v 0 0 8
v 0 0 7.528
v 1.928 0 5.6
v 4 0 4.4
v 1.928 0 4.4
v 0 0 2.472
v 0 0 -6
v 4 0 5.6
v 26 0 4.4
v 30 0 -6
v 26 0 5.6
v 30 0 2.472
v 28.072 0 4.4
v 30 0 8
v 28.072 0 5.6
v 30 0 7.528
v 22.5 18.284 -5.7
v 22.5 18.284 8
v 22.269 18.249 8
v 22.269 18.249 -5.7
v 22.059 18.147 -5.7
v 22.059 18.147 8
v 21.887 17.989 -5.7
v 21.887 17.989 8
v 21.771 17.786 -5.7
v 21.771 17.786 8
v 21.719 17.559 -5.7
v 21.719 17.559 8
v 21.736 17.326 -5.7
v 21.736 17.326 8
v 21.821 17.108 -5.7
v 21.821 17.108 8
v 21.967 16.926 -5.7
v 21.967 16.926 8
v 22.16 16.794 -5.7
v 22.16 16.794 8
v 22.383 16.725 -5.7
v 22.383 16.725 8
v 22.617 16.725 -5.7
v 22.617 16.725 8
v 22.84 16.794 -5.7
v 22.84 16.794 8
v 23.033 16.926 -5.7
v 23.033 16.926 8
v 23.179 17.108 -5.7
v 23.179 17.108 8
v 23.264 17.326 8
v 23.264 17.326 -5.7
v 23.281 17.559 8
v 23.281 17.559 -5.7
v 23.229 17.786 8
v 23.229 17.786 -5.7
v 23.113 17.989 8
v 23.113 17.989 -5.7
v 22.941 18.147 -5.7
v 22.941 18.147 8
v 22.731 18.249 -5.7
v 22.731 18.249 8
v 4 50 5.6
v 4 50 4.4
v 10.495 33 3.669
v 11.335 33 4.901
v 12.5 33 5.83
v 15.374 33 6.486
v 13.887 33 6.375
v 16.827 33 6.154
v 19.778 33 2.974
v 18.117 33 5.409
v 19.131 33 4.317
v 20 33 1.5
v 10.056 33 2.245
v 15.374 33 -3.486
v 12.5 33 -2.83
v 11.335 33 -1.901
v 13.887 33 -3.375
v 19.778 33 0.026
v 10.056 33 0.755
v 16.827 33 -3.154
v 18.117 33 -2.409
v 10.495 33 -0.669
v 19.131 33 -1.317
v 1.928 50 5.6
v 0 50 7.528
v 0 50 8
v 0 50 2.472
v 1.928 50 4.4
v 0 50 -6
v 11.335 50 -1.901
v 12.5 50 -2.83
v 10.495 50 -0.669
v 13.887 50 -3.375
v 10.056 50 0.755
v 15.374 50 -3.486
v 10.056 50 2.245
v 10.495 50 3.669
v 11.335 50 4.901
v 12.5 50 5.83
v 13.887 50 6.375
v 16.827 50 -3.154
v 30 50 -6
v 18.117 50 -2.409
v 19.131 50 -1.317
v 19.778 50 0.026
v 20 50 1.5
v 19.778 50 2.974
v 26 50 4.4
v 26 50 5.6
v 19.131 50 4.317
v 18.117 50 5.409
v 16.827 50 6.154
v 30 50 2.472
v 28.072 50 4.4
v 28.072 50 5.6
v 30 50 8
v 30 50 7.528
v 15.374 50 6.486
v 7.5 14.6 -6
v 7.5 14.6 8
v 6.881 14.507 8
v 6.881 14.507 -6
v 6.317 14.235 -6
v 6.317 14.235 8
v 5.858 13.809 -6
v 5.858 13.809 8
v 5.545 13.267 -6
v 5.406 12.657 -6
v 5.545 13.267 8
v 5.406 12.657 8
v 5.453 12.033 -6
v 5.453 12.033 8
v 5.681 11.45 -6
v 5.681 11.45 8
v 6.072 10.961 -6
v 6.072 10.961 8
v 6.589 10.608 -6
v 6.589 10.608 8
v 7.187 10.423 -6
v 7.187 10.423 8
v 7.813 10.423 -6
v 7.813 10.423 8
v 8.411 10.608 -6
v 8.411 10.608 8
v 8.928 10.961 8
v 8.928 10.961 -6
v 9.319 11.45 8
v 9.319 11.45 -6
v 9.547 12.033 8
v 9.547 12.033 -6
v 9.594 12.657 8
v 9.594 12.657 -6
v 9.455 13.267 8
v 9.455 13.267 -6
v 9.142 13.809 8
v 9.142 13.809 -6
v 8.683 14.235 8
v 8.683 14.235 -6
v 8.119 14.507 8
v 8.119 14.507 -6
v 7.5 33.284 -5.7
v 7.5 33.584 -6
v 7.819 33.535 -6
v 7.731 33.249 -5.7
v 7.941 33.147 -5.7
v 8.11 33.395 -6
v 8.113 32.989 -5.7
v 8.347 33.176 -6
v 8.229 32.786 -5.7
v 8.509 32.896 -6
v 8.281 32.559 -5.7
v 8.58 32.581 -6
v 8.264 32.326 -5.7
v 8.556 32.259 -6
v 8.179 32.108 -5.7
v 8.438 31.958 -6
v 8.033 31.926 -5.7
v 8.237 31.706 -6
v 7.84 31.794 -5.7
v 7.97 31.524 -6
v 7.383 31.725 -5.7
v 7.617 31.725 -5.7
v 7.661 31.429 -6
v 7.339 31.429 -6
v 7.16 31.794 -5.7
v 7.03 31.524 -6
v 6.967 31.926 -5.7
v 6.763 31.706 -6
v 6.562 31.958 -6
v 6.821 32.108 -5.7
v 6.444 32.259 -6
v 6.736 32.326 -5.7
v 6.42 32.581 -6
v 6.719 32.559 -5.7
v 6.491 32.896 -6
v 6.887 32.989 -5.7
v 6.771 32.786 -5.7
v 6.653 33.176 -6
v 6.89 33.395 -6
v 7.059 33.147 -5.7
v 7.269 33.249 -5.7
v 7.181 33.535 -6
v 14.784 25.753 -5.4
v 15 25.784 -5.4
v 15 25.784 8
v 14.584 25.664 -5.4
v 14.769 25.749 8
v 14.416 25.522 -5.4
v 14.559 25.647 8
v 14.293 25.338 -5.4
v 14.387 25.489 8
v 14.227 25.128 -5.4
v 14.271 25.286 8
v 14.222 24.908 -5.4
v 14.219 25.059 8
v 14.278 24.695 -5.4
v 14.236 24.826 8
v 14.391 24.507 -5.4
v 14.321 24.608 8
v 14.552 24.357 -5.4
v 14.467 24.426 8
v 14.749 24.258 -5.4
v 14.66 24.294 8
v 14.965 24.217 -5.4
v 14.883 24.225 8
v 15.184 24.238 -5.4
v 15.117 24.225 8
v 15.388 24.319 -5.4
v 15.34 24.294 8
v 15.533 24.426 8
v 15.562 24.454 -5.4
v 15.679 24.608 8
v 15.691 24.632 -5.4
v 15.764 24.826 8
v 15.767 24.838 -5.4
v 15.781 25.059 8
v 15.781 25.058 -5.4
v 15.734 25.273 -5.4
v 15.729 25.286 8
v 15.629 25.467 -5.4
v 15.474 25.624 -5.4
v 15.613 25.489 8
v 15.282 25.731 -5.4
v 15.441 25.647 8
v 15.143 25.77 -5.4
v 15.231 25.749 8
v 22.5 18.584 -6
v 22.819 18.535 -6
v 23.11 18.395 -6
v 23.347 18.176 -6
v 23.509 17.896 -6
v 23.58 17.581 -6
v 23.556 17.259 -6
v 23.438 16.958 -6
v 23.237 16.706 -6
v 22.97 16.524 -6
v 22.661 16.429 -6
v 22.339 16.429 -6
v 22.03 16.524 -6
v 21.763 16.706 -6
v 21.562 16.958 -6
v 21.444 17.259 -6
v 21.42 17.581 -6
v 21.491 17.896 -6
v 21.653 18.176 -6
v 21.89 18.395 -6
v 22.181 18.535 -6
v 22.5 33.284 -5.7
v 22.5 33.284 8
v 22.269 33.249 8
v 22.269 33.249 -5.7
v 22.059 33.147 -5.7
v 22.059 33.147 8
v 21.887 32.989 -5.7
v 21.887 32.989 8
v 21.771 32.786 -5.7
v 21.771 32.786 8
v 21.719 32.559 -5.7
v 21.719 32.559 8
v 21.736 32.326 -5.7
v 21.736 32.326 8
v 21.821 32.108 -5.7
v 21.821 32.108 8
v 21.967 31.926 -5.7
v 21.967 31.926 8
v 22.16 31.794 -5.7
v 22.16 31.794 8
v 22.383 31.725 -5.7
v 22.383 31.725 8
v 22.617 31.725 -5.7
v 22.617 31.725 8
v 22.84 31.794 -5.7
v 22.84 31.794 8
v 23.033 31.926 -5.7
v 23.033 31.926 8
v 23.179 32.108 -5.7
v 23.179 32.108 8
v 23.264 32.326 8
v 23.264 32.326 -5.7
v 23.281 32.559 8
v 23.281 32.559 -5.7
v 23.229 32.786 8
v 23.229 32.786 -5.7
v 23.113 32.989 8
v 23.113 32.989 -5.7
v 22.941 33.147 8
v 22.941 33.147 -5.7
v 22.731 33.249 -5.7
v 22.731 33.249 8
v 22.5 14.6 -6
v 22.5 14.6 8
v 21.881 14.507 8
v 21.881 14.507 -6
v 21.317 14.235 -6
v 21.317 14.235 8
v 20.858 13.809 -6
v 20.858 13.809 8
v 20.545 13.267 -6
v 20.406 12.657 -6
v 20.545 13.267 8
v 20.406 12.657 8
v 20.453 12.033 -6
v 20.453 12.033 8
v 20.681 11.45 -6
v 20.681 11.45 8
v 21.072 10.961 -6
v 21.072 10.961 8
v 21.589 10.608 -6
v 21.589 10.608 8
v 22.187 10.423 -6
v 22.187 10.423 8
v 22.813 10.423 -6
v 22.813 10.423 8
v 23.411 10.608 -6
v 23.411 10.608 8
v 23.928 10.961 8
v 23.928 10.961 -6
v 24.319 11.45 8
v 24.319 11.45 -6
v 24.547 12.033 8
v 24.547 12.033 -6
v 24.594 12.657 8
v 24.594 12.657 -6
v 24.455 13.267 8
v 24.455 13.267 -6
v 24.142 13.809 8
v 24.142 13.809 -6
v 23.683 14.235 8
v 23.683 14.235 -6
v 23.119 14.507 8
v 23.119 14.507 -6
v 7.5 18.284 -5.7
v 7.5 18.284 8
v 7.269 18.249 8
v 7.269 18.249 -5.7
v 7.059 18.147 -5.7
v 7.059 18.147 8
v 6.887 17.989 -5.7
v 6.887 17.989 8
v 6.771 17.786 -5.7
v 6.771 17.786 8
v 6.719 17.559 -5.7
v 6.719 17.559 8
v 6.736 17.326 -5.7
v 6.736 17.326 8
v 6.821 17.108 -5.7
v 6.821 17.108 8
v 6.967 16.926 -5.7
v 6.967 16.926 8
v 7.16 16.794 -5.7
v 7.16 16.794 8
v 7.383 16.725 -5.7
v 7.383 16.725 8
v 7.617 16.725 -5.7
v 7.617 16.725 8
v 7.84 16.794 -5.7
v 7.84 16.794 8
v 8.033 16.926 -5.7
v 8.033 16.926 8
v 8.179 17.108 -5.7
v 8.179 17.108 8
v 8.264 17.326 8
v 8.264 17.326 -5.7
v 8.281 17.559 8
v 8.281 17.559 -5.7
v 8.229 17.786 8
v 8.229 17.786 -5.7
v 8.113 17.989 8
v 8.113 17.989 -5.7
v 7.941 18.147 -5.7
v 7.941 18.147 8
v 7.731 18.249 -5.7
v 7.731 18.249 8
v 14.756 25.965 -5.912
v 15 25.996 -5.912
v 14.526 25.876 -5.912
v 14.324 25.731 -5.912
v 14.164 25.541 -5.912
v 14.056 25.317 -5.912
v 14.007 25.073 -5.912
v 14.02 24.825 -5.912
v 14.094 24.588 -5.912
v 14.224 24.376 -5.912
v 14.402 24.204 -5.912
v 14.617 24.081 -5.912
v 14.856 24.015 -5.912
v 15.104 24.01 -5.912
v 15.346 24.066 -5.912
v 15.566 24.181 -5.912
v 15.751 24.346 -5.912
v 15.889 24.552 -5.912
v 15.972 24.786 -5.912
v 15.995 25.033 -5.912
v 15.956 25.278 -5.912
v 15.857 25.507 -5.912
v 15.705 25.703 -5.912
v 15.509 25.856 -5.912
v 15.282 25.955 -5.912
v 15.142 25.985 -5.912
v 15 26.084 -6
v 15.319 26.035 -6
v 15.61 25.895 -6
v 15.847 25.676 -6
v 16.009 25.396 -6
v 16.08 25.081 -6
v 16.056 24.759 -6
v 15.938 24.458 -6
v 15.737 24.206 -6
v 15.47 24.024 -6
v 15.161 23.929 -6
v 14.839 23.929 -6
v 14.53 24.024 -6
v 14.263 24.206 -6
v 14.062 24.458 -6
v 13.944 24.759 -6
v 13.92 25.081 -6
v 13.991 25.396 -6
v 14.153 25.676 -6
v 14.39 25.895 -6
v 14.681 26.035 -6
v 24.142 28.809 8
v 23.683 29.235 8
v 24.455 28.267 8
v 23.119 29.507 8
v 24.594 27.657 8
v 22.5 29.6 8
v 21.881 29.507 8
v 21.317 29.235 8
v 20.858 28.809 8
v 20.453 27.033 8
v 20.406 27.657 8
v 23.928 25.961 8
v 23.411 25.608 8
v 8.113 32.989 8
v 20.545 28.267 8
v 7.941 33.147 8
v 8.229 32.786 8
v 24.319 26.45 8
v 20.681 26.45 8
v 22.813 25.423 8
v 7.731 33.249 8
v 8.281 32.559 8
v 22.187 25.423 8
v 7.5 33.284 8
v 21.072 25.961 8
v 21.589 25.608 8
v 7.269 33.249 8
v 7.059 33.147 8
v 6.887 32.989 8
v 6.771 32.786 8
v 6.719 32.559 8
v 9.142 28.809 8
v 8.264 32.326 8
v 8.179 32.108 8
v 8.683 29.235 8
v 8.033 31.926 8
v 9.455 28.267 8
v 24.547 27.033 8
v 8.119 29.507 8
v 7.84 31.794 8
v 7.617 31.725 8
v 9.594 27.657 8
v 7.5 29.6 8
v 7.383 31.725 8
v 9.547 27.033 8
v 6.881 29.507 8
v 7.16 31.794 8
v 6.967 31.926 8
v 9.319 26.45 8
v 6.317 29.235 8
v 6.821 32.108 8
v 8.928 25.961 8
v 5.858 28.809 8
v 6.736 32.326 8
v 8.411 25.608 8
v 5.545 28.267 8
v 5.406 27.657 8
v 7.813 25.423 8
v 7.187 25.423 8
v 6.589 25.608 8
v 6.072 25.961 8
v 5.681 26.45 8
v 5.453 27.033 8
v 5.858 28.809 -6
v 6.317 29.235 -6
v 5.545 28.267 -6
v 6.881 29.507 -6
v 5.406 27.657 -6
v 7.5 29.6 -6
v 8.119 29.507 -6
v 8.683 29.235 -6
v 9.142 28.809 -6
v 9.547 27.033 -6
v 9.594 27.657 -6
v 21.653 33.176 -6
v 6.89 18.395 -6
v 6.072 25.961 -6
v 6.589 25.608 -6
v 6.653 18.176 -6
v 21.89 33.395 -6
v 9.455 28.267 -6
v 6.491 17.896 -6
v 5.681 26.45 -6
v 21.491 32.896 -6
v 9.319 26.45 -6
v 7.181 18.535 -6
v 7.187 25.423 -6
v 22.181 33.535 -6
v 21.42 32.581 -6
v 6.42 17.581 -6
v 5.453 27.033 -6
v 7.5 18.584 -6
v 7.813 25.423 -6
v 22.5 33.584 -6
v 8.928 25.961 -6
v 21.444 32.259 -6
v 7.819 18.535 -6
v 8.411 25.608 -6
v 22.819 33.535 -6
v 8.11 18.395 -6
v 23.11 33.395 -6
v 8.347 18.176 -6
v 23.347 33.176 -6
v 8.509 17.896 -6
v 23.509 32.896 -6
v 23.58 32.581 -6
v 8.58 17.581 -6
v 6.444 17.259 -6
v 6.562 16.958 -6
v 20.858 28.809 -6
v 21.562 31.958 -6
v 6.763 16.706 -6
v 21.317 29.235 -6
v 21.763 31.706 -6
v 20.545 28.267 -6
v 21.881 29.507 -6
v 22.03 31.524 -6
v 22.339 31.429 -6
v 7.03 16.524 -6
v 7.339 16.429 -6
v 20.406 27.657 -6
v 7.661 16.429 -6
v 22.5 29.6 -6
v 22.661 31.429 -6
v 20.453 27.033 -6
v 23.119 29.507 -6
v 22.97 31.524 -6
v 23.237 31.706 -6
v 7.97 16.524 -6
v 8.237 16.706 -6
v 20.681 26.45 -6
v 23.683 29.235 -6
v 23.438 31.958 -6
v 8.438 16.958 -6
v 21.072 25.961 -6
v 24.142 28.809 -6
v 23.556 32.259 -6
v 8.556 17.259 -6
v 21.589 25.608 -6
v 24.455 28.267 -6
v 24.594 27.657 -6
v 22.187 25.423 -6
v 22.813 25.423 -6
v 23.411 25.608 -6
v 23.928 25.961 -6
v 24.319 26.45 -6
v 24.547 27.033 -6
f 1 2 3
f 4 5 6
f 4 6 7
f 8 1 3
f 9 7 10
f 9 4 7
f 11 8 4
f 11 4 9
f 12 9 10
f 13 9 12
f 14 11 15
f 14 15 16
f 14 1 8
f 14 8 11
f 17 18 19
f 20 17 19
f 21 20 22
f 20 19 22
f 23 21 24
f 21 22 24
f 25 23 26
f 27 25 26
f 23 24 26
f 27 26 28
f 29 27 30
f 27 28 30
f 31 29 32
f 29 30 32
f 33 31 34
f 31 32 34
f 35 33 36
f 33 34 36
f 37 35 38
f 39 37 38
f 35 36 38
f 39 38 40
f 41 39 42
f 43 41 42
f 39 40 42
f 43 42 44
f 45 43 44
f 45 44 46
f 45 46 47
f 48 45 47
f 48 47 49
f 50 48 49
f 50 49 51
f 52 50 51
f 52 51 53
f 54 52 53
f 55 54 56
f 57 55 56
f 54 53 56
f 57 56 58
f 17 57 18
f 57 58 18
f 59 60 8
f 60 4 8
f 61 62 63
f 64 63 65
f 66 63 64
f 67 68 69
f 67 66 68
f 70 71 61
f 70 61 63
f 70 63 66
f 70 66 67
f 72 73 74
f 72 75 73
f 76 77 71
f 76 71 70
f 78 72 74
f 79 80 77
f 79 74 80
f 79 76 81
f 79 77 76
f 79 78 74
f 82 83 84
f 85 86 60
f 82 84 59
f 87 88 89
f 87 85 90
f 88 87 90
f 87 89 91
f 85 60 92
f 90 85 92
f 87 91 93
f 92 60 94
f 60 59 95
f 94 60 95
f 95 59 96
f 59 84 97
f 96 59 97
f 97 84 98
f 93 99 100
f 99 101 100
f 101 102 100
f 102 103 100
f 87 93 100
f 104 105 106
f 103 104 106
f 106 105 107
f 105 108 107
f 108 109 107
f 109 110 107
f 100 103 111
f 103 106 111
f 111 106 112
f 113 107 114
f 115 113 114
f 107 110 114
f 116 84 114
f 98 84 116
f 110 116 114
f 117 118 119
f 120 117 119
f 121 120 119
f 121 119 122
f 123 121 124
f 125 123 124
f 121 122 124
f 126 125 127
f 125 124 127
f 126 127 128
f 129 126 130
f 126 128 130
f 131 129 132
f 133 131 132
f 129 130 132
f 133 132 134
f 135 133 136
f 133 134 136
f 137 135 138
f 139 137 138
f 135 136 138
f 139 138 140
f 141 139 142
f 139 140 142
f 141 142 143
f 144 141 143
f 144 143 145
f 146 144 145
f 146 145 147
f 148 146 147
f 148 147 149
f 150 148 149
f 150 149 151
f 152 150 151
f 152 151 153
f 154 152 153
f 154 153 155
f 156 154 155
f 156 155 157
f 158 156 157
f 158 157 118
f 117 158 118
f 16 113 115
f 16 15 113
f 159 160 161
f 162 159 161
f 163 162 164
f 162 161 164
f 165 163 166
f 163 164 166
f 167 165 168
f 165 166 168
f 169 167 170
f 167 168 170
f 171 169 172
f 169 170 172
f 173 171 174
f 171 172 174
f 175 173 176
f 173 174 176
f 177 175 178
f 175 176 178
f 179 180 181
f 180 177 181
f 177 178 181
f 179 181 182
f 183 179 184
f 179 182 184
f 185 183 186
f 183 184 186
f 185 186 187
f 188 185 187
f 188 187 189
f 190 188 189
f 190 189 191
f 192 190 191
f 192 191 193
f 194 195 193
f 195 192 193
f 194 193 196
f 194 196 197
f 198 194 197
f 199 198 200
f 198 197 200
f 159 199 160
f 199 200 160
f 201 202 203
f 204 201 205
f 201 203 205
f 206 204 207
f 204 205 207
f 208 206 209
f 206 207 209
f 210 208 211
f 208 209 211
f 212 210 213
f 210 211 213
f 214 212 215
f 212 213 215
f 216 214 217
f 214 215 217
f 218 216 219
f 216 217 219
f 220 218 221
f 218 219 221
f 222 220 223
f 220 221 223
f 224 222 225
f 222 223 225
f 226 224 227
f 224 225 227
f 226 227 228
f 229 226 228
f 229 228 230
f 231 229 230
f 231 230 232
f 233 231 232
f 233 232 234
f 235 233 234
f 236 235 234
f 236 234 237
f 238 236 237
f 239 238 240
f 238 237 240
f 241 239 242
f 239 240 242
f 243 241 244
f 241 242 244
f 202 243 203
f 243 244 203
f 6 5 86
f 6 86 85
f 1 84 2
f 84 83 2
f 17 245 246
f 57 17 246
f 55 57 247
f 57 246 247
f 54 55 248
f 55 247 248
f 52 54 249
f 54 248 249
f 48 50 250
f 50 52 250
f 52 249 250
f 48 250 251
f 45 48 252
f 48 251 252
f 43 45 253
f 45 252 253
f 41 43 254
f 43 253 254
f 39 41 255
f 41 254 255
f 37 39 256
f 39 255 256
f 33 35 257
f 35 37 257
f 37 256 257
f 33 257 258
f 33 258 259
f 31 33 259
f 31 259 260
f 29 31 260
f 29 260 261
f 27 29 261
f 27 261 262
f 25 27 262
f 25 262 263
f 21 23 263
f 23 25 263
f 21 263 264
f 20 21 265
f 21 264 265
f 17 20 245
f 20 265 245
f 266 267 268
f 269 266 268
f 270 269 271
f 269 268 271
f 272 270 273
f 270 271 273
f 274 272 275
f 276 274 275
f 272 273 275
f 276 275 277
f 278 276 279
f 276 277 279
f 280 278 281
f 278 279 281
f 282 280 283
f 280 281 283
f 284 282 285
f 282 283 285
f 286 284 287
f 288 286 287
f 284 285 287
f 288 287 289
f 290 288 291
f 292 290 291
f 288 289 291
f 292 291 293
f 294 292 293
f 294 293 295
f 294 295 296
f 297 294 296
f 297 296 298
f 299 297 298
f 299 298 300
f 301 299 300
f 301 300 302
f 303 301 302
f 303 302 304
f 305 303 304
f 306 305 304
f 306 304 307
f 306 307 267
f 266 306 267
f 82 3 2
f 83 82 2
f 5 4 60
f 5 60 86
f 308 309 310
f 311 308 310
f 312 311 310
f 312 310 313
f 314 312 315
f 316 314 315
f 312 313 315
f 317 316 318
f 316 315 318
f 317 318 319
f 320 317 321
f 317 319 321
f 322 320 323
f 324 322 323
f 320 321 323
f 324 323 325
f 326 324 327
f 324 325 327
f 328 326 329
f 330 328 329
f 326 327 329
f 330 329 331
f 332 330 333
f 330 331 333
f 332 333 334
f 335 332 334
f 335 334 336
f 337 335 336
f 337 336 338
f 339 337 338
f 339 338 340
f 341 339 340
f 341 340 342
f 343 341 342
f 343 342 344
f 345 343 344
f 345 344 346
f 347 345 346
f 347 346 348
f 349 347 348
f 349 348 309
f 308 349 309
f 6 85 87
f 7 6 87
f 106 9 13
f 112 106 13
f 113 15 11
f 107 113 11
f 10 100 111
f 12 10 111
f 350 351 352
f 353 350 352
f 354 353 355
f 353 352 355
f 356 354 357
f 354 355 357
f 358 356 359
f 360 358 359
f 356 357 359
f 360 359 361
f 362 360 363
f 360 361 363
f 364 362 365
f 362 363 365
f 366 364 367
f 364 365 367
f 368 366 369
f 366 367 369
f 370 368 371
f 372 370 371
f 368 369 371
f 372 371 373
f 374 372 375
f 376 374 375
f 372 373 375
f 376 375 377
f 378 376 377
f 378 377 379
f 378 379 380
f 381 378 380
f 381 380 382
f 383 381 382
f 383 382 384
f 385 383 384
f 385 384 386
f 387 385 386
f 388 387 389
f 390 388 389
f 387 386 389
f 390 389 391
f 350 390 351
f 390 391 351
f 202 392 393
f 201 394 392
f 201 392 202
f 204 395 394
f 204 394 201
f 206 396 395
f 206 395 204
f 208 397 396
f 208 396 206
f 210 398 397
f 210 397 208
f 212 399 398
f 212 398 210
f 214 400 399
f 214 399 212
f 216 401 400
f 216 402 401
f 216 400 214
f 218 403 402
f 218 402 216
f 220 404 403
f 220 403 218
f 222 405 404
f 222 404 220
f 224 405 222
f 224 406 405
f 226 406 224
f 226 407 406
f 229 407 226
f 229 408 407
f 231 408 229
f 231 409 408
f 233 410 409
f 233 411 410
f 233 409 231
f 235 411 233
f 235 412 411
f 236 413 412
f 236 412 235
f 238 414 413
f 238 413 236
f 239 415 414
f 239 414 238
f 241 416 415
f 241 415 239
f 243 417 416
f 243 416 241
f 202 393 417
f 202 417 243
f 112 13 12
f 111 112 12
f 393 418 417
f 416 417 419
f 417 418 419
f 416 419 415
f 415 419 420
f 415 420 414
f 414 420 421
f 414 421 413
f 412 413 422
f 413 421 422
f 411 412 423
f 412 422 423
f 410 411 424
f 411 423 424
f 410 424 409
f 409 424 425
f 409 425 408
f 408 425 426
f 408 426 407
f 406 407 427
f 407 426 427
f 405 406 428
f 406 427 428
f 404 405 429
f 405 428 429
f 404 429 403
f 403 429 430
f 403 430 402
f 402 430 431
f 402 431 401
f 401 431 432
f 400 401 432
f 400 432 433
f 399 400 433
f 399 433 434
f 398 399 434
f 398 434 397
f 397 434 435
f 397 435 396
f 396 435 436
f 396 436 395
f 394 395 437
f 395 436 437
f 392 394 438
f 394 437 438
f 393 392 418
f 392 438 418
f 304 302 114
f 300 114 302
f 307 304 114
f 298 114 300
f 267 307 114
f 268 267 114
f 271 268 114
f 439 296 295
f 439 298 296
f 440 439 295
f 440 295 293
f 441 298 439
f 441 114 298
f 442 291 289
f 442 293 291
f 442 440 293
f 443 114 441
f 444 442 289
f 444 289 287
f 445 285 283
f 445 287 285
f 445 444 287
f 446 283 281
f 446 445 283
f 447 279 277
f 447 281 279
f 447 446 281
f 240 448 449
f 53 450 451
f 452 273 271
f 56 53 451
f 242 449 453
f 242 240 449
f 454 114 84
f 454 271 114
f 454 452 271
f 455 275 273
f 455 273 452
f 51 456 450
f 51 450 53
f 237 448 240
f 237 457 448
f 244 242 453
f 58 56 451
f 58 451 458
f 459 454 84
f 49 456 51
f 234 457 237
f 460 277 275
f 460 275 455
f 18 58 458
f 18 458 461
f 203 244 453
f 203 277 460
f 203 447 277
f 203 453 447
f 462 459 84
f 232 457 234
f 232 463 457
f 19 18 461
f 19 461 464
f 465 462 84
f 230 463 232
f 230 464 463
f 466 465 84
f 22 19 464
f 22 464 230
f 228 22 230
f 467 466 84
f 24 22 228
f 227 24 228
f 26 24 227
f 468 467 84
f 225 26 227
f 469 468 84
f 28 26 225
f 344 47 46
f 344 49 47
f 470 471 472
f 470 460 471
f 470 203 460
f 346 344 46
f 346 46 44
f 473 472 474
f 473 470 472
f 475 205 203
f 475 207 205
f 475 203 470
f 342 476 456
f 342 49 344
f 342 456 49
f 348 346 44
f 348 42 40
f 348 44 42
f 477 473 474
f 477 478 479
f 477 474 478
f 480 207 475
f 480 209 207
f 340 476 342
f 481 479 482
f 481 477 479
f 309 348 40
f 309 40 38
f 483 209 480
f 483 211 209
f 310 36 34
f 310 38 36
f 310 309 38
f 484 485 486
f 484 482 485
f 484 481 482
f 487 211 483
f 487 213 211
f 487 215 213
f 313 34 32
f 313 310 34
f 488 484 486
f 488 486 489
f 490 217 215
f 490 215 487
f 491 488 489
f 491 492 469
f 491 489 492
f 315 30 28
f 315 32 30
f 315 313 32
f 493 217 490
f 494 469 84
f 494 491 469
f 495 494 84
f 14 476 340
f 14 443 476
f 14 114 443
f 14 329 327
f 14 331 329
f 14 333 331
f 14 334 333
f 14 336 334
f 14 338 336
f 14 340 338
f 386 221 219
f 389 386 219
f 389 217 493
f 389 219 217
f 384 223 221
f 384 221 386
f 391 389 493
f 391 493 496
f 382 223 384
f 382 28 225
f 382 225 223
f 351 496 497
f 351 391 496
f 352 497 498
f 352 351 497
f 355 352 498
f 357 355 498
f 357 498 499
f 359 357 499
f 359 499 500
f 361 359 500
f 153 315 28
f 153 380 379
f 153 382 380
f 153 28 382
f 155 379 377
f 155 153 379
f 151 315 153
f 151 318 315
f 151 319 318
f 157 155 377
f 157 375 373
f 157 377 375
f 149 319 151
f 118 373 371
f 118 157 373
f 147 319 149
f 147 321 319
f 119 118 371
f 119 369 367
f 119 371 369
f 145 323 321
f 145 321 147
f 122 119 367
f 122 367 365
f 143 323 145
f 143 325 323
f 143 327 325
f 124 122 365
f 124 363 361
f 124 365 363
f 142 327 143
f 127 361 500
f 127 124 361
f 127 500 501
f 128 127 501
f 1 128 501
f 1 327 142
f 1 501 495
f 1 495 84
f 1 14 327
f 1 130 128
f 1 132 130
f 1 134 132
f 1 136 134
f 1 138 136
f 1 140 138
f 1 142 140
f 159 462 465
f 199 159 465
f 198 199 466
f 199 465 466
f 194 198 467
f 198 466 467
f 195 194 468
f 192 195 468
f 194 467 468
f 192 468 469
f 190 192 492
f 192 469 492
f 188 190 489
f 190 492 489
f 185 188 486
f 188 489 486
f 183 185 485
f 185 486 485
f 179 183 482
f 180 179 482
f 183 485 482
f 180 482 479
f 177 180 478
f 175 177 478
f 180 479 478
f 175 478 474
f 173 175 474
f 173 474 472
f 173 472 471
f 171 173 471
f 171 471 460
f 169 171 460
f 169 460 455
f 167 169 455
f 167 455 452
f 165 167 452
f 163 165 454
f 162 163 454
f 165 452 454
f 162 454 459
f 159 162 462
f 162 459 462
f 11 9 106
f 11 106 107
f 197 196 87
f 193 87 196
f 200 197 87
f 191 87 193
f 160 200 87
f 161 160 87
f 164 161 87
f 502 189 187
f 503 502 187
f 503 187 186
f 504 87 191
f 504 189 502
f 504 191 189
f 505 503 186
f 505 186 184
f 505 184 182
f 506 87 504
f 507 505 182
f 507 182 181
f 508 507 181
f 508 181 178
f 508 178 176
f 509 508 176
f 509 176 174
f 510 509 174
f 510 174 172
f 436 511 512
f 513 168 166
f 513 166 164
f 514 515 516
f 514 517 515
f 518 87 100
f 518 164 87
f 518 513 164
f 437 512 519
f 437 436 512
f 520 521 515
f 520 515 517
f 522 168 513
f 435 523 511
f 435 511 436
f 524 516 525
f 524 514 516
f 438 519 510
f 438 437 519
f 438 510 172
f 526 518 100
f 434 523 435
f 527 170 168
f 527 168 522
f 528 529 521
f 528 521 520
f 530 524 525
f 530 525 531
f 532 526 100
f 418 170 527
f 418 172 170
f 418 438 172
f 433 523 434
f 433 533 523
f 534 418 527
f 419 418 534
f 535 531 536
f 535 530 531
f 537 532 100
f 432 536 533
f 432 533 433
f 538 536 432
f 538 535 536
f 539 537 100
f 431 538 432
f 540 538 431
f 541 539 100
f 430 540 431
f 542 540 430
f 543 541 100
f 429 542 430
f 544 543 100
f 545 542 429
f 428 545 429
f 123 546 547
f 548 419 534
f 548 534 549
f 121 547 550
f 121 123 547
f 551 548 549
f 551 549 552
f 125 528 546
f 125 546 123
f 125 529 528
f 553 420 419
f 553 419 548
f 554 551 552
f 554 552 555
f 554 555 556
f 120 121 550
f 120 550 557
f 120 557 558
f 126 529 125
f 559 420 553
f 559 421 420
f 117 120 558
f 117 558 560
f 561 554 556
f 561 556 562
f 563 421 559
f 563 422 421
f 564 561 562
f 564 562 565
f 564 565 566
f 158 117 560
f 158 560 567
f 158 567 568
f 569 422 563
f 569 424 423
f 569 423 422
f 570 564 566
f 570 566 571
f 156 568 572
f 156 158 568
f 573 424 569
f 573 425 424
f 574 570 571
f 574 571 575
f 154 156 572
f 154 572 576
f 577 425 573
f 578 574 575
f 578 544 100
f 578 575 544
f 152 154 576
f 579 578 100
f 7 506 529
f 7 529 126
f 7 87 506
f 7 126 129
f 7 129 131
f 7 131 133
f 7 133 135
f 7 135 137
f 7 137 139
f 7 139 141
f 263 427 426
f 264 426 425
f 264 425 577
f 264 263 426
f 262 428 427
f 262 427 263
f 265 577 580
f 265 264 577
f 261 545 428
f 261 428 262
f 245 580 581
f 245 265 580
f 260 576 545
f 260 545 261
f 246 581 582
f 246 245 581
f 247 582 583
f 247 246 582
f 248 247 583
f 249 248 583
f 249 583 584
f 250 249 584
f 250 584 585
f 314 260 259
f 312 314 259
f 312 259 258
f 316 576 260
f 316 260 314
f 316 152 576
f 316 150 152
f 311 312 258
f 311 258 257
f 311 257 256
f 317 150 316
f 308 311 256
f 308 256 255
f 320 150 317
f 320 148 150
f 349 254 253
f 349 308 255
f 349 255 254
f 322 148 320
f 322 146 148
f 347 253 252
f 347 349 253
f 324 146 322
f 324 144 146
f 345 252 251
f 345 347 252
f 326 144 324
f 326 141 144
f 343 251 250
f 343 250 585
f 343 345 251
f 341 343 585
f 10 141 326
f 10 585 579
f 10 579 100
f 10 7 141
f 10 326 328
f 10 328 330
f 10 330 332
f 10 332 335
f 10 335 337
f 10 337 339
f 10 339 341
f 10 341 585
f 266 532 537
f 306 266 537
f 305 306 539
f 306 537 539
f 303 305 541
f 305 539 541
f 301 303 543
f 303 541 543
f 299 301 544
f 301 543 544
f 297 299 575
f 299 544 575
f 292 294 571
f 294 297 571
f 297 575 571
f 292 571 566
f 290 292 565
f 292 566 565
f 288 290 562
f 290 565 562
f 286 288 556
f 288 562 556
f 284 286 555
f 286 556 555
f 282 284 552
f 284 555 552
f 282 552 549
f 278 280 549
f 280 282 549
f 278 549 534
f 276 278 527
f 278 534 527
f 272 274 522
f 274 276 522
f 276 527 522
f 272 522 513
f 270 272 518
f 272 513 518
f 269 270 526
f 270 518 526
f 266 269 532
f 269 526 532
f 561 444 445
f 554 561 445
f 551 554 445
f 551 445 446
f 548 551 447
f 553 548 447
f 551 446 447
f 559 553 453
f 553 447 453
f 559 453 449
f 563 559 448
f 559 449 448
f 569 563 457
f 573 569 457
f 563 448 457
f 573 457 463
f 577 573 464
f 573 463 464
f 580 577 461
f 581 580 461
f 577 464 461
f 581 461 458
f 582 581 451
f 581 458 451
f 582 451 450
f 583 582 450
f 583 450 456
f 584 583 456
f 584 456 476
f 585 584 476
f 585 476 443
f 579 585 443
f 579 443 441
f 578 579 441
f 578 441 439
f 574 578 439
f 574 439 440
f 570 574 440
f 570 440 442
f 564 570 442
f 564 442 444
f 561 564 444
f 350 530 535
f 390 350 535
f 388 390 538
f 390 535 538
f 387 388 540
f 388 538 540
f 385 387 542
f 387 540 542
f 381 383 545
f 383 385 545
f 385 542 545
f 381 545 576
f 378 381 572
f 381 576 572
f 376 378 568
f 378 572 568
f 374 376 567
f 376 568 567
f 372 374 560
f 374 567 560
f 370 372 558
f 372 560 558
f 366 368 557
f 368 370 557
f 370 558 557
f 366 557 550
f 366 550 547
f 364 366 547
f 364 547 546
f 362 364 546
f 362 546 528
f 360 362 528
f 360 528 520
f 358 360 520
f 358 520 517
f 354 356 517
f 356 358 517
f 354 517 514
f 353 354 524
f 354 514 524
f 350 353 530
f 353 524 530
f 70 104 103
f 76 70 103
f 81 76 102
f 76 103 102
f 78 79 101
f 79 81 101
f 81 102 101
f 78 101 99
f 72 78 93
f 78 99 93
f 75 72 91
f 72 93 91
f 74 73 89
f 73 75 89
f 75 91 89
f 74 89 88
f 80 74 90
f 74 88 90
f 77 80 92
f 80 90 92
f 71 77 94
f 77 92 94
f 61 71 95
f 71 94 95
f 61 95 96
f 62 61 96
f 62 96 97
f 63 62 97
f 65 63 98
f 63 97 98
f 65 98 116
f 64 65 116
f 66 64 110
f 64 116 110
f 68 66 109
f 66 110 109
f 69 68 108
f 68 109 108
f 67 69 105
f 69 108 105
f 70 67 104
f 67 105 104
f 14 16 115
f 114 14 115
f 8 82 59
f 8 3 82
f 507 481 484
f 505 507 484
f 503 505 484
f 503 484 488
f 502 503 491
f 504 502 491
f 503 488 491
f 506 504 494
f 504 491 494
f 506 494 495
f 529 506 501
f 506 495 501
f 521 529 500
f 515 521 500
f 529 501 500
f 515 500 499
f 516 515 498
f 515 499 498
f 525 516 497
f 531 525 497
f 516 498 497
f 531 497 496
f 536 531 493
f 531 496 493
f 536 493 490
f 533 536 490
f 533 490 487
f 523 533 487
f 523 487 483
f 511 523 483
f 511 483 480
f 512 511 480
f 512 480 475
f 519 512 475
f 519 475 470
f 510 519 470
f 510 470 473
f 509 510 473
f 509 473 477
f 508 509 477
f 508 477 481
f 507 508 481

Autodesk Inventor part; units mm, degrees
ref_plane "YZ Plane" through (0, 0, 0) normal (1, 0, 0) x (0, 1, 0)
ref_plane "XZ Plane" through (0, 0, 0) normal (0, 1, 0) x (-1, 0, 0)
ref_plane "XY Plane" through (0, 0, 0) normal (0, 0, 1) x (1, 0, 0)
sketch "Sketch1" plane through (0, 0, 0) normal (0, 0, 1) x (1, 0, 0)
  line L0 (0, 0) -> (30, 0)
  line L1 (30, 0) -> (30, 50)
  line L2 (30, 50) -> (0, 50)
  line L3 (0, 50) -> (0, 0)
  dimension "d0" = 30
  dimension "d1" = 50
extrude "Extrusion1" add sketch "Sketch1" along normal blind 10
sketch "Sketch2" plane through (0, 0, 0) normal (0, -1, 0) x (1, 0, 0)
  line L0 (30, 0) -> (30, 10) projected
  line L1 (30, 0) -> (30, 1.5)
  line L2 (15, 0) -> (15, 12.0836) construction
  line L3 (30, 10) -> (30, 9) construction
  line L4 (30, 9) -> (-1.4785, 9) construction
  line L5 (27.4716, 5) -> (-0.9945, 5) construction
  line L6 (30, 5) -> (30.3, 5) construction
  line L7 (28.0716, 4.4) -> (30, 2.4716)
  line L8 (28.0716, 5.6) -> (30, 7.5284)
  line L9 (30, 5) -> (30, 5.6) construction
  line L10 (28.0716, 5.6) -> (25, 5.6)
  line L11 (25, 5.6) -> (25, 4.4)
  line L12 (25, 4.4) -> (28.0716, 4.4)
  arc A0 (30, 6.9774) -> (28.8858, 6.4142) centre (30.3, 5) ccw construction
  arc A1 (28.3921, 4.4) -> (28.8858, 3.5858) centre (30.3, 5) ccw construction
  line L13 (1.9284, 4.4) -> (0, 2.4716)
  line L14 (1.9284, 5.6) -> (0, 7.5284)
  line L15 (1.9284, 5.6) -> (5, 5.6)
  line L16 (5, 5.6) -> (5, 4.4)
  line L17 (5, 4.4) -> (1.9284, 4.4)
  line L18 (30, 10) -> (0, 10) projected
  line L19 (0, 0) -> (0, 10) projected
  line L20 (0, 10) -> (0, 0)
  line L21 (30, 0) -> (30, -3)
  line L22 (30, -3) -> (0, -3)
  line L23 (0, -3) -> (0, 0)
  line L24 (30, 0) -> (0, 0) projected
  line L25 (0, 0) -> (30, 0)
  circle A2 centre (15, 5) radius 1.5
  line L26 (4, 4.4) -> (4, 5.6)
  line L27 (25, 4.4) -> (26, 4.4)
  line L28 (26, 4.4) -> (26, 5.6)
  line L29 (25, 5.6) -> (25, 4.4)
  point P0 (4, 5)
  dimension "d4" = 1.5
  dimension "d7" = 1
  dimension "d9" = 0.3
  dimension "d11" = 90
  dimension "d12" = 0.6
  dimension "d13" = 5
  dimension "d14" = 1.2
  dimension "d27" = 3
  dimension "d31" = 3
  dimension "d90" = 5
  dimension "d91" = 4
  dimension "d94" = 1
extrude "Extrusion3" cut sketch "Sketch2" against normal blind 50 contours L7 L12 L28 L10 L8 L0 | L19 L14 L15 L26 L17 L13
sketch "Sketch4" plane through (0, 0, 0) normal (0, -1, 0) x (1, 0, 0)
  line L0 (30, 0) -> (0, 0) projected
  line L1 (30, 0) -> (0, 0)
  line L2 (0, 0) -> (0, -6)
  line L3 (0, -6) -> (30, -6)
  line L4 (30, -6) -> (30, 0)
  dimension "d28" = 6
extrude "Extrusion5" add sketch "Sketch4" against normal blind 50
sketch "Sketch5" plane through (1.9284, 0, 5.6) normal (0, -1, 0) x (1, 0, 0)
  line L0 (23.0716, -1.2) -> (23.0716, 0) projected
  line L1 (23.0716, -0.6) -> (3.0716, -0.6) construction
  line L2 (19.0716, 2.4) -> (7.0716, 2.4) projected
  line L3 (13.0716, 2.4) -> (13.0716, -11.6) construction
  line L4 (-1.9284, -11.6) -> (28.0716, -11.6) projected
  line L5 (13.0716, 2.4) -> (13.0716, -4.1)
  line L6 (13.0716, -4.1) -> (-1.9284, -4.1) construction
  line L7 (-1.9284, -11.6) -> (-1.9284, -3.1284) construction
  point P0 (-1.9284, -5.6)
  dimension "d33" = 6.5
ref_plane "Work Plane1" through (30, 0, -6) normal (0, 0, -1) x (-1, 0, 0)
sketch "Sketch7" plane through (25, 50, 5.6) normal (0, 1, 0) x (1, 0, 0)
  line L0 (-25, -1.9284) -> (-23.0716, 0) projected
  line L1 (-25, 11.6) -> (-25, 3.1284) projected
  line L2 (-25, -1.9284) -> (-25, 3.1284)
  line L3 (-23.0716, 1.2) -> (-25, 3.1284) projected
  line L4 (-25, 3.1284) -> (-23.0716, 1.2)
  line L5 (-20, 0) -> (-20, 1.2) projected
  line L6 (-23.0716, 1.2) -> (-20, 1.2)
  line L7 (-20, 1.2) -> (-20, 0)
  line L8 (-20, 0) -> (-23.0716, 0)
  line L9 (-23.0716, 0) -> (-25, -1.9284)
  line L10 (0, 0) -> (0, 1.2) projected
  line L11 (0, 0) -> (0, 1.2)
  line L12 (0, 1.2) -> (3.4081, 1.2)
  line L13 (3.0716, 1.2) -> (5, 3.1284) projected
  line L14 (5, 3.1284) -> (3.0716, 1.2)
  line L15 (3.0716, 0) -> (1, 0) projected
  line L16 (0, 0) -> (3.0716, 0)
  line L17 (5, -1.9284) -> (3.0716, 0) projected
  line L18 (3.0716, 0) -> (5, -1.9284)
  line L19 (5, -1.9284) -> (5, 3.1284)
  point P0 (-25, 5.6)
sketch "Sketch8" plane through (1.9284, 0, 5.6) normal (0, -1, 0) x (1, 0, 0)
  line L0 (28.0716, 1.9284) -> (28.0716, 4.4) projected
  line L1 (28.0716, 1.9284) -> (28.0716, -3.1284)
  line L2 (28.0716, -3.1284) -> (26.1431, -1.2)
  line L3 (23.0716, -1.2) -> (23.0716, 0) projected
  line L4 (26.1431, -1.2) -> (23.0716, -1.2)
  line L5 (23.0716, -1.2) -> (23.0716, 0)
  line L6 (23.0716, 0) -> (26.1431, 0)
  line L7 (26.1431, 0) -> (28.0716, 1.9284)
  line L8 (13.0716, -3.7758) -> (13.0716, 8.1492) construction
  line L9 (-1.9284, -3.1284) -> (0, -1.2)
  line L10 (-1.9284, 1.9284) -> (-1.9284, -3.1284)
  line L11 (3.0716, -1.2) -> (3.0716, 0)
  line L12 (0, -1.2) -> (3.0716, -1.2)
  line L13 (3.0716, 0) -> (0, 0)
  line L14 (0, 0) -> (-1.9284, 1.9284)
  line L15 (23.0716, -1.2) -> (24.0716, -1.2)
  line L16 (24.0716, -1.2) -> (24.0716, 0)
  line L17 (23.0716, 0) -> (23.0716, -1.2)
  point P0 (-1.9284, -5.6)
  dimension "d93" = 1
sketch "Sketch10" plane through (30, 0, -6) normal (0, 0, -1) x (-1, 0, 0)
  line L0 (0, 50) -> (30, 50) construction
  line L1 (0, 50) -> (7.5, 50) construction
  line L2 (7.5, 50) -> (7.5, 32.5) construction
  line L3 (30, 50) -> (22.5, 50) construction
  line L4 (22.5, 50) -> (22.5, 32.5) construction
  line L5 (30, 0) -> (0, 0) construction
  line L6 (0, 0) -> (7.5, 0) construction
  line L7 (7.5, 0) -> (7.5, 17.5) construction
  line L8 (30, 0) -> (22.5, 0) construction
  line L9 (22.5, 0) -> (22.5, 17.5) construction
  line L10 (21, 50) -> (9, 50) construction
  line L11 (15, 50) -> (15, 25) construction
  line L12 (0, 0) -> (0, 50) construction
  line L13 (15, 25) -> (0, 25)
  point P0 (0, 5)
  point P1 (0, 45)
  dimension "d53" = 7.5
  dimension "d54" = 17.5
  dimension "d55" = 7.5
  dimension "d56" = 17.5
  dimension "d57" = 7.5
  dimension "d58" = 17.5
  dimension "d59" = 7.5
  dimension "d60" = 17.5
hole "Hole2" at (22.5, 17.5, -6) at (7.5, 17.5, -6) at (7.5, 32.5, -6) at (22.5, 32.5, -6) at (15, 25, -6) direction (0, 0, 1) diameter 1.567 end through all thread size "M2x0.4" class "6H" standard "ISO Metric profile"
sketch "Sketch11" plane through (30, 0, -6) normal (0, 0, -1) x (-1, 0, 0)
  circle A0 centre (22.5, 32.5) radius 0.7835 projected
  circle A1 centre (7.5, 32.5) radius 0.7835 projected
  point P0 (30, 0)
  point P1 (22.5, 12.5)
  point P2 (7.5, 12.5)
  point P3 (22.5, 27.5)
  point P4 (7.5, 27.5)
  dimension "d68" = 20
  dimension "d76" = 15
hole "Hole3" at (7.5, 12.5, -6) at (22.5, 12.5, -6) at (7.5, 27.5, -6) at (22.5, 27.5, -6) direction (0, 0, 1) diameter 4.2 end through all
chamfer "Chamfer1" distance 0.3 angle 45 5 edges at (7.5, 31.7165, -6) (7.5, 16.7165, -6) (22.5, 16.7165, -6) (22.5, 31.7165, -6) (15, 24.2165, -6)
sketch "Sketch12" plane through (0, 0, 10) normal (0, -1, 0) x (1, 0, 0)
  line L0 (30, -2.4716) -> (30, 0) projected
  line L1 (30, 0) -> (30, -2)
  line L2 (30, -2) -> (0, -2)
  line L3 (30, -2) -> (30, 0)
  line L4 (0, 0) -> (30, 0) projected
  line L5 (0, 0) -> (0, -2)
  line L6 (0, -2.4716) -> (0, 0) projected
  point P0 (0, -10)
  dimension "d80" = 2
extrude "Extrusion10" cut sketch "Sketch12" against normal through all
chamfer "Chamfer2" distance 0.3 angle 45 1 edges at (15, 24.2165, -5.7)
sketch "Sketch13" plane through (25, 50, 5.6) normal (0, 1, 0) x (1, 0, 0)
  line L0 (-8.9165, 11.6) -> (-11.0835, 11.6) construction
  line L1 (-10, 11.6) -> (-10, 3.4303) construction
  point P0 (-25, 5.6)
sketch "Sketch14" plane through (25, 50, 5.6) normal (0, 1, 0) x (1, 0, 0)
  line L0 (-10.7835, -2.4) -> (-9.2165, -2.4) projected
  line L1 (-10, -2.4) -> (-10, 4.1)
  circle A0 centre (-10, 4.1) radius 5
  point P0 (-25, 5.6)
  dimension "d86" = 6.5
  dimension "d87" = 10
extrude "Extrusion11" cut sketch "Sketch14" against normal blind 17
sketch "Sketch15" plane through (25, 0, 4.4) normal (0, -1, 0) x (1, 0, 0)
  line L0 (3.0716, 0) -> (1, 0) projected
  line L1 (0, 0) -> (1, 0)
  line L2 (1, 0) -> (1, 1.2)
  line L3 (1, 1.2) -> (3.0716, 1.2) projected
  line L4 (1, 0) -> (0, 0)
  line L5 (0, 0) -> (0, 1.2) projected
  line L6 (0, 1.2) -> (1, 1.2)
  point P0 (-25, -4.4)
  dimension "d92" = 1
equation "\"d54\" = d56"
equation "\"d58\" = d56"
equation "\"d60\" = d56"
properties part number "Platform" material "Steel, Carbon"
